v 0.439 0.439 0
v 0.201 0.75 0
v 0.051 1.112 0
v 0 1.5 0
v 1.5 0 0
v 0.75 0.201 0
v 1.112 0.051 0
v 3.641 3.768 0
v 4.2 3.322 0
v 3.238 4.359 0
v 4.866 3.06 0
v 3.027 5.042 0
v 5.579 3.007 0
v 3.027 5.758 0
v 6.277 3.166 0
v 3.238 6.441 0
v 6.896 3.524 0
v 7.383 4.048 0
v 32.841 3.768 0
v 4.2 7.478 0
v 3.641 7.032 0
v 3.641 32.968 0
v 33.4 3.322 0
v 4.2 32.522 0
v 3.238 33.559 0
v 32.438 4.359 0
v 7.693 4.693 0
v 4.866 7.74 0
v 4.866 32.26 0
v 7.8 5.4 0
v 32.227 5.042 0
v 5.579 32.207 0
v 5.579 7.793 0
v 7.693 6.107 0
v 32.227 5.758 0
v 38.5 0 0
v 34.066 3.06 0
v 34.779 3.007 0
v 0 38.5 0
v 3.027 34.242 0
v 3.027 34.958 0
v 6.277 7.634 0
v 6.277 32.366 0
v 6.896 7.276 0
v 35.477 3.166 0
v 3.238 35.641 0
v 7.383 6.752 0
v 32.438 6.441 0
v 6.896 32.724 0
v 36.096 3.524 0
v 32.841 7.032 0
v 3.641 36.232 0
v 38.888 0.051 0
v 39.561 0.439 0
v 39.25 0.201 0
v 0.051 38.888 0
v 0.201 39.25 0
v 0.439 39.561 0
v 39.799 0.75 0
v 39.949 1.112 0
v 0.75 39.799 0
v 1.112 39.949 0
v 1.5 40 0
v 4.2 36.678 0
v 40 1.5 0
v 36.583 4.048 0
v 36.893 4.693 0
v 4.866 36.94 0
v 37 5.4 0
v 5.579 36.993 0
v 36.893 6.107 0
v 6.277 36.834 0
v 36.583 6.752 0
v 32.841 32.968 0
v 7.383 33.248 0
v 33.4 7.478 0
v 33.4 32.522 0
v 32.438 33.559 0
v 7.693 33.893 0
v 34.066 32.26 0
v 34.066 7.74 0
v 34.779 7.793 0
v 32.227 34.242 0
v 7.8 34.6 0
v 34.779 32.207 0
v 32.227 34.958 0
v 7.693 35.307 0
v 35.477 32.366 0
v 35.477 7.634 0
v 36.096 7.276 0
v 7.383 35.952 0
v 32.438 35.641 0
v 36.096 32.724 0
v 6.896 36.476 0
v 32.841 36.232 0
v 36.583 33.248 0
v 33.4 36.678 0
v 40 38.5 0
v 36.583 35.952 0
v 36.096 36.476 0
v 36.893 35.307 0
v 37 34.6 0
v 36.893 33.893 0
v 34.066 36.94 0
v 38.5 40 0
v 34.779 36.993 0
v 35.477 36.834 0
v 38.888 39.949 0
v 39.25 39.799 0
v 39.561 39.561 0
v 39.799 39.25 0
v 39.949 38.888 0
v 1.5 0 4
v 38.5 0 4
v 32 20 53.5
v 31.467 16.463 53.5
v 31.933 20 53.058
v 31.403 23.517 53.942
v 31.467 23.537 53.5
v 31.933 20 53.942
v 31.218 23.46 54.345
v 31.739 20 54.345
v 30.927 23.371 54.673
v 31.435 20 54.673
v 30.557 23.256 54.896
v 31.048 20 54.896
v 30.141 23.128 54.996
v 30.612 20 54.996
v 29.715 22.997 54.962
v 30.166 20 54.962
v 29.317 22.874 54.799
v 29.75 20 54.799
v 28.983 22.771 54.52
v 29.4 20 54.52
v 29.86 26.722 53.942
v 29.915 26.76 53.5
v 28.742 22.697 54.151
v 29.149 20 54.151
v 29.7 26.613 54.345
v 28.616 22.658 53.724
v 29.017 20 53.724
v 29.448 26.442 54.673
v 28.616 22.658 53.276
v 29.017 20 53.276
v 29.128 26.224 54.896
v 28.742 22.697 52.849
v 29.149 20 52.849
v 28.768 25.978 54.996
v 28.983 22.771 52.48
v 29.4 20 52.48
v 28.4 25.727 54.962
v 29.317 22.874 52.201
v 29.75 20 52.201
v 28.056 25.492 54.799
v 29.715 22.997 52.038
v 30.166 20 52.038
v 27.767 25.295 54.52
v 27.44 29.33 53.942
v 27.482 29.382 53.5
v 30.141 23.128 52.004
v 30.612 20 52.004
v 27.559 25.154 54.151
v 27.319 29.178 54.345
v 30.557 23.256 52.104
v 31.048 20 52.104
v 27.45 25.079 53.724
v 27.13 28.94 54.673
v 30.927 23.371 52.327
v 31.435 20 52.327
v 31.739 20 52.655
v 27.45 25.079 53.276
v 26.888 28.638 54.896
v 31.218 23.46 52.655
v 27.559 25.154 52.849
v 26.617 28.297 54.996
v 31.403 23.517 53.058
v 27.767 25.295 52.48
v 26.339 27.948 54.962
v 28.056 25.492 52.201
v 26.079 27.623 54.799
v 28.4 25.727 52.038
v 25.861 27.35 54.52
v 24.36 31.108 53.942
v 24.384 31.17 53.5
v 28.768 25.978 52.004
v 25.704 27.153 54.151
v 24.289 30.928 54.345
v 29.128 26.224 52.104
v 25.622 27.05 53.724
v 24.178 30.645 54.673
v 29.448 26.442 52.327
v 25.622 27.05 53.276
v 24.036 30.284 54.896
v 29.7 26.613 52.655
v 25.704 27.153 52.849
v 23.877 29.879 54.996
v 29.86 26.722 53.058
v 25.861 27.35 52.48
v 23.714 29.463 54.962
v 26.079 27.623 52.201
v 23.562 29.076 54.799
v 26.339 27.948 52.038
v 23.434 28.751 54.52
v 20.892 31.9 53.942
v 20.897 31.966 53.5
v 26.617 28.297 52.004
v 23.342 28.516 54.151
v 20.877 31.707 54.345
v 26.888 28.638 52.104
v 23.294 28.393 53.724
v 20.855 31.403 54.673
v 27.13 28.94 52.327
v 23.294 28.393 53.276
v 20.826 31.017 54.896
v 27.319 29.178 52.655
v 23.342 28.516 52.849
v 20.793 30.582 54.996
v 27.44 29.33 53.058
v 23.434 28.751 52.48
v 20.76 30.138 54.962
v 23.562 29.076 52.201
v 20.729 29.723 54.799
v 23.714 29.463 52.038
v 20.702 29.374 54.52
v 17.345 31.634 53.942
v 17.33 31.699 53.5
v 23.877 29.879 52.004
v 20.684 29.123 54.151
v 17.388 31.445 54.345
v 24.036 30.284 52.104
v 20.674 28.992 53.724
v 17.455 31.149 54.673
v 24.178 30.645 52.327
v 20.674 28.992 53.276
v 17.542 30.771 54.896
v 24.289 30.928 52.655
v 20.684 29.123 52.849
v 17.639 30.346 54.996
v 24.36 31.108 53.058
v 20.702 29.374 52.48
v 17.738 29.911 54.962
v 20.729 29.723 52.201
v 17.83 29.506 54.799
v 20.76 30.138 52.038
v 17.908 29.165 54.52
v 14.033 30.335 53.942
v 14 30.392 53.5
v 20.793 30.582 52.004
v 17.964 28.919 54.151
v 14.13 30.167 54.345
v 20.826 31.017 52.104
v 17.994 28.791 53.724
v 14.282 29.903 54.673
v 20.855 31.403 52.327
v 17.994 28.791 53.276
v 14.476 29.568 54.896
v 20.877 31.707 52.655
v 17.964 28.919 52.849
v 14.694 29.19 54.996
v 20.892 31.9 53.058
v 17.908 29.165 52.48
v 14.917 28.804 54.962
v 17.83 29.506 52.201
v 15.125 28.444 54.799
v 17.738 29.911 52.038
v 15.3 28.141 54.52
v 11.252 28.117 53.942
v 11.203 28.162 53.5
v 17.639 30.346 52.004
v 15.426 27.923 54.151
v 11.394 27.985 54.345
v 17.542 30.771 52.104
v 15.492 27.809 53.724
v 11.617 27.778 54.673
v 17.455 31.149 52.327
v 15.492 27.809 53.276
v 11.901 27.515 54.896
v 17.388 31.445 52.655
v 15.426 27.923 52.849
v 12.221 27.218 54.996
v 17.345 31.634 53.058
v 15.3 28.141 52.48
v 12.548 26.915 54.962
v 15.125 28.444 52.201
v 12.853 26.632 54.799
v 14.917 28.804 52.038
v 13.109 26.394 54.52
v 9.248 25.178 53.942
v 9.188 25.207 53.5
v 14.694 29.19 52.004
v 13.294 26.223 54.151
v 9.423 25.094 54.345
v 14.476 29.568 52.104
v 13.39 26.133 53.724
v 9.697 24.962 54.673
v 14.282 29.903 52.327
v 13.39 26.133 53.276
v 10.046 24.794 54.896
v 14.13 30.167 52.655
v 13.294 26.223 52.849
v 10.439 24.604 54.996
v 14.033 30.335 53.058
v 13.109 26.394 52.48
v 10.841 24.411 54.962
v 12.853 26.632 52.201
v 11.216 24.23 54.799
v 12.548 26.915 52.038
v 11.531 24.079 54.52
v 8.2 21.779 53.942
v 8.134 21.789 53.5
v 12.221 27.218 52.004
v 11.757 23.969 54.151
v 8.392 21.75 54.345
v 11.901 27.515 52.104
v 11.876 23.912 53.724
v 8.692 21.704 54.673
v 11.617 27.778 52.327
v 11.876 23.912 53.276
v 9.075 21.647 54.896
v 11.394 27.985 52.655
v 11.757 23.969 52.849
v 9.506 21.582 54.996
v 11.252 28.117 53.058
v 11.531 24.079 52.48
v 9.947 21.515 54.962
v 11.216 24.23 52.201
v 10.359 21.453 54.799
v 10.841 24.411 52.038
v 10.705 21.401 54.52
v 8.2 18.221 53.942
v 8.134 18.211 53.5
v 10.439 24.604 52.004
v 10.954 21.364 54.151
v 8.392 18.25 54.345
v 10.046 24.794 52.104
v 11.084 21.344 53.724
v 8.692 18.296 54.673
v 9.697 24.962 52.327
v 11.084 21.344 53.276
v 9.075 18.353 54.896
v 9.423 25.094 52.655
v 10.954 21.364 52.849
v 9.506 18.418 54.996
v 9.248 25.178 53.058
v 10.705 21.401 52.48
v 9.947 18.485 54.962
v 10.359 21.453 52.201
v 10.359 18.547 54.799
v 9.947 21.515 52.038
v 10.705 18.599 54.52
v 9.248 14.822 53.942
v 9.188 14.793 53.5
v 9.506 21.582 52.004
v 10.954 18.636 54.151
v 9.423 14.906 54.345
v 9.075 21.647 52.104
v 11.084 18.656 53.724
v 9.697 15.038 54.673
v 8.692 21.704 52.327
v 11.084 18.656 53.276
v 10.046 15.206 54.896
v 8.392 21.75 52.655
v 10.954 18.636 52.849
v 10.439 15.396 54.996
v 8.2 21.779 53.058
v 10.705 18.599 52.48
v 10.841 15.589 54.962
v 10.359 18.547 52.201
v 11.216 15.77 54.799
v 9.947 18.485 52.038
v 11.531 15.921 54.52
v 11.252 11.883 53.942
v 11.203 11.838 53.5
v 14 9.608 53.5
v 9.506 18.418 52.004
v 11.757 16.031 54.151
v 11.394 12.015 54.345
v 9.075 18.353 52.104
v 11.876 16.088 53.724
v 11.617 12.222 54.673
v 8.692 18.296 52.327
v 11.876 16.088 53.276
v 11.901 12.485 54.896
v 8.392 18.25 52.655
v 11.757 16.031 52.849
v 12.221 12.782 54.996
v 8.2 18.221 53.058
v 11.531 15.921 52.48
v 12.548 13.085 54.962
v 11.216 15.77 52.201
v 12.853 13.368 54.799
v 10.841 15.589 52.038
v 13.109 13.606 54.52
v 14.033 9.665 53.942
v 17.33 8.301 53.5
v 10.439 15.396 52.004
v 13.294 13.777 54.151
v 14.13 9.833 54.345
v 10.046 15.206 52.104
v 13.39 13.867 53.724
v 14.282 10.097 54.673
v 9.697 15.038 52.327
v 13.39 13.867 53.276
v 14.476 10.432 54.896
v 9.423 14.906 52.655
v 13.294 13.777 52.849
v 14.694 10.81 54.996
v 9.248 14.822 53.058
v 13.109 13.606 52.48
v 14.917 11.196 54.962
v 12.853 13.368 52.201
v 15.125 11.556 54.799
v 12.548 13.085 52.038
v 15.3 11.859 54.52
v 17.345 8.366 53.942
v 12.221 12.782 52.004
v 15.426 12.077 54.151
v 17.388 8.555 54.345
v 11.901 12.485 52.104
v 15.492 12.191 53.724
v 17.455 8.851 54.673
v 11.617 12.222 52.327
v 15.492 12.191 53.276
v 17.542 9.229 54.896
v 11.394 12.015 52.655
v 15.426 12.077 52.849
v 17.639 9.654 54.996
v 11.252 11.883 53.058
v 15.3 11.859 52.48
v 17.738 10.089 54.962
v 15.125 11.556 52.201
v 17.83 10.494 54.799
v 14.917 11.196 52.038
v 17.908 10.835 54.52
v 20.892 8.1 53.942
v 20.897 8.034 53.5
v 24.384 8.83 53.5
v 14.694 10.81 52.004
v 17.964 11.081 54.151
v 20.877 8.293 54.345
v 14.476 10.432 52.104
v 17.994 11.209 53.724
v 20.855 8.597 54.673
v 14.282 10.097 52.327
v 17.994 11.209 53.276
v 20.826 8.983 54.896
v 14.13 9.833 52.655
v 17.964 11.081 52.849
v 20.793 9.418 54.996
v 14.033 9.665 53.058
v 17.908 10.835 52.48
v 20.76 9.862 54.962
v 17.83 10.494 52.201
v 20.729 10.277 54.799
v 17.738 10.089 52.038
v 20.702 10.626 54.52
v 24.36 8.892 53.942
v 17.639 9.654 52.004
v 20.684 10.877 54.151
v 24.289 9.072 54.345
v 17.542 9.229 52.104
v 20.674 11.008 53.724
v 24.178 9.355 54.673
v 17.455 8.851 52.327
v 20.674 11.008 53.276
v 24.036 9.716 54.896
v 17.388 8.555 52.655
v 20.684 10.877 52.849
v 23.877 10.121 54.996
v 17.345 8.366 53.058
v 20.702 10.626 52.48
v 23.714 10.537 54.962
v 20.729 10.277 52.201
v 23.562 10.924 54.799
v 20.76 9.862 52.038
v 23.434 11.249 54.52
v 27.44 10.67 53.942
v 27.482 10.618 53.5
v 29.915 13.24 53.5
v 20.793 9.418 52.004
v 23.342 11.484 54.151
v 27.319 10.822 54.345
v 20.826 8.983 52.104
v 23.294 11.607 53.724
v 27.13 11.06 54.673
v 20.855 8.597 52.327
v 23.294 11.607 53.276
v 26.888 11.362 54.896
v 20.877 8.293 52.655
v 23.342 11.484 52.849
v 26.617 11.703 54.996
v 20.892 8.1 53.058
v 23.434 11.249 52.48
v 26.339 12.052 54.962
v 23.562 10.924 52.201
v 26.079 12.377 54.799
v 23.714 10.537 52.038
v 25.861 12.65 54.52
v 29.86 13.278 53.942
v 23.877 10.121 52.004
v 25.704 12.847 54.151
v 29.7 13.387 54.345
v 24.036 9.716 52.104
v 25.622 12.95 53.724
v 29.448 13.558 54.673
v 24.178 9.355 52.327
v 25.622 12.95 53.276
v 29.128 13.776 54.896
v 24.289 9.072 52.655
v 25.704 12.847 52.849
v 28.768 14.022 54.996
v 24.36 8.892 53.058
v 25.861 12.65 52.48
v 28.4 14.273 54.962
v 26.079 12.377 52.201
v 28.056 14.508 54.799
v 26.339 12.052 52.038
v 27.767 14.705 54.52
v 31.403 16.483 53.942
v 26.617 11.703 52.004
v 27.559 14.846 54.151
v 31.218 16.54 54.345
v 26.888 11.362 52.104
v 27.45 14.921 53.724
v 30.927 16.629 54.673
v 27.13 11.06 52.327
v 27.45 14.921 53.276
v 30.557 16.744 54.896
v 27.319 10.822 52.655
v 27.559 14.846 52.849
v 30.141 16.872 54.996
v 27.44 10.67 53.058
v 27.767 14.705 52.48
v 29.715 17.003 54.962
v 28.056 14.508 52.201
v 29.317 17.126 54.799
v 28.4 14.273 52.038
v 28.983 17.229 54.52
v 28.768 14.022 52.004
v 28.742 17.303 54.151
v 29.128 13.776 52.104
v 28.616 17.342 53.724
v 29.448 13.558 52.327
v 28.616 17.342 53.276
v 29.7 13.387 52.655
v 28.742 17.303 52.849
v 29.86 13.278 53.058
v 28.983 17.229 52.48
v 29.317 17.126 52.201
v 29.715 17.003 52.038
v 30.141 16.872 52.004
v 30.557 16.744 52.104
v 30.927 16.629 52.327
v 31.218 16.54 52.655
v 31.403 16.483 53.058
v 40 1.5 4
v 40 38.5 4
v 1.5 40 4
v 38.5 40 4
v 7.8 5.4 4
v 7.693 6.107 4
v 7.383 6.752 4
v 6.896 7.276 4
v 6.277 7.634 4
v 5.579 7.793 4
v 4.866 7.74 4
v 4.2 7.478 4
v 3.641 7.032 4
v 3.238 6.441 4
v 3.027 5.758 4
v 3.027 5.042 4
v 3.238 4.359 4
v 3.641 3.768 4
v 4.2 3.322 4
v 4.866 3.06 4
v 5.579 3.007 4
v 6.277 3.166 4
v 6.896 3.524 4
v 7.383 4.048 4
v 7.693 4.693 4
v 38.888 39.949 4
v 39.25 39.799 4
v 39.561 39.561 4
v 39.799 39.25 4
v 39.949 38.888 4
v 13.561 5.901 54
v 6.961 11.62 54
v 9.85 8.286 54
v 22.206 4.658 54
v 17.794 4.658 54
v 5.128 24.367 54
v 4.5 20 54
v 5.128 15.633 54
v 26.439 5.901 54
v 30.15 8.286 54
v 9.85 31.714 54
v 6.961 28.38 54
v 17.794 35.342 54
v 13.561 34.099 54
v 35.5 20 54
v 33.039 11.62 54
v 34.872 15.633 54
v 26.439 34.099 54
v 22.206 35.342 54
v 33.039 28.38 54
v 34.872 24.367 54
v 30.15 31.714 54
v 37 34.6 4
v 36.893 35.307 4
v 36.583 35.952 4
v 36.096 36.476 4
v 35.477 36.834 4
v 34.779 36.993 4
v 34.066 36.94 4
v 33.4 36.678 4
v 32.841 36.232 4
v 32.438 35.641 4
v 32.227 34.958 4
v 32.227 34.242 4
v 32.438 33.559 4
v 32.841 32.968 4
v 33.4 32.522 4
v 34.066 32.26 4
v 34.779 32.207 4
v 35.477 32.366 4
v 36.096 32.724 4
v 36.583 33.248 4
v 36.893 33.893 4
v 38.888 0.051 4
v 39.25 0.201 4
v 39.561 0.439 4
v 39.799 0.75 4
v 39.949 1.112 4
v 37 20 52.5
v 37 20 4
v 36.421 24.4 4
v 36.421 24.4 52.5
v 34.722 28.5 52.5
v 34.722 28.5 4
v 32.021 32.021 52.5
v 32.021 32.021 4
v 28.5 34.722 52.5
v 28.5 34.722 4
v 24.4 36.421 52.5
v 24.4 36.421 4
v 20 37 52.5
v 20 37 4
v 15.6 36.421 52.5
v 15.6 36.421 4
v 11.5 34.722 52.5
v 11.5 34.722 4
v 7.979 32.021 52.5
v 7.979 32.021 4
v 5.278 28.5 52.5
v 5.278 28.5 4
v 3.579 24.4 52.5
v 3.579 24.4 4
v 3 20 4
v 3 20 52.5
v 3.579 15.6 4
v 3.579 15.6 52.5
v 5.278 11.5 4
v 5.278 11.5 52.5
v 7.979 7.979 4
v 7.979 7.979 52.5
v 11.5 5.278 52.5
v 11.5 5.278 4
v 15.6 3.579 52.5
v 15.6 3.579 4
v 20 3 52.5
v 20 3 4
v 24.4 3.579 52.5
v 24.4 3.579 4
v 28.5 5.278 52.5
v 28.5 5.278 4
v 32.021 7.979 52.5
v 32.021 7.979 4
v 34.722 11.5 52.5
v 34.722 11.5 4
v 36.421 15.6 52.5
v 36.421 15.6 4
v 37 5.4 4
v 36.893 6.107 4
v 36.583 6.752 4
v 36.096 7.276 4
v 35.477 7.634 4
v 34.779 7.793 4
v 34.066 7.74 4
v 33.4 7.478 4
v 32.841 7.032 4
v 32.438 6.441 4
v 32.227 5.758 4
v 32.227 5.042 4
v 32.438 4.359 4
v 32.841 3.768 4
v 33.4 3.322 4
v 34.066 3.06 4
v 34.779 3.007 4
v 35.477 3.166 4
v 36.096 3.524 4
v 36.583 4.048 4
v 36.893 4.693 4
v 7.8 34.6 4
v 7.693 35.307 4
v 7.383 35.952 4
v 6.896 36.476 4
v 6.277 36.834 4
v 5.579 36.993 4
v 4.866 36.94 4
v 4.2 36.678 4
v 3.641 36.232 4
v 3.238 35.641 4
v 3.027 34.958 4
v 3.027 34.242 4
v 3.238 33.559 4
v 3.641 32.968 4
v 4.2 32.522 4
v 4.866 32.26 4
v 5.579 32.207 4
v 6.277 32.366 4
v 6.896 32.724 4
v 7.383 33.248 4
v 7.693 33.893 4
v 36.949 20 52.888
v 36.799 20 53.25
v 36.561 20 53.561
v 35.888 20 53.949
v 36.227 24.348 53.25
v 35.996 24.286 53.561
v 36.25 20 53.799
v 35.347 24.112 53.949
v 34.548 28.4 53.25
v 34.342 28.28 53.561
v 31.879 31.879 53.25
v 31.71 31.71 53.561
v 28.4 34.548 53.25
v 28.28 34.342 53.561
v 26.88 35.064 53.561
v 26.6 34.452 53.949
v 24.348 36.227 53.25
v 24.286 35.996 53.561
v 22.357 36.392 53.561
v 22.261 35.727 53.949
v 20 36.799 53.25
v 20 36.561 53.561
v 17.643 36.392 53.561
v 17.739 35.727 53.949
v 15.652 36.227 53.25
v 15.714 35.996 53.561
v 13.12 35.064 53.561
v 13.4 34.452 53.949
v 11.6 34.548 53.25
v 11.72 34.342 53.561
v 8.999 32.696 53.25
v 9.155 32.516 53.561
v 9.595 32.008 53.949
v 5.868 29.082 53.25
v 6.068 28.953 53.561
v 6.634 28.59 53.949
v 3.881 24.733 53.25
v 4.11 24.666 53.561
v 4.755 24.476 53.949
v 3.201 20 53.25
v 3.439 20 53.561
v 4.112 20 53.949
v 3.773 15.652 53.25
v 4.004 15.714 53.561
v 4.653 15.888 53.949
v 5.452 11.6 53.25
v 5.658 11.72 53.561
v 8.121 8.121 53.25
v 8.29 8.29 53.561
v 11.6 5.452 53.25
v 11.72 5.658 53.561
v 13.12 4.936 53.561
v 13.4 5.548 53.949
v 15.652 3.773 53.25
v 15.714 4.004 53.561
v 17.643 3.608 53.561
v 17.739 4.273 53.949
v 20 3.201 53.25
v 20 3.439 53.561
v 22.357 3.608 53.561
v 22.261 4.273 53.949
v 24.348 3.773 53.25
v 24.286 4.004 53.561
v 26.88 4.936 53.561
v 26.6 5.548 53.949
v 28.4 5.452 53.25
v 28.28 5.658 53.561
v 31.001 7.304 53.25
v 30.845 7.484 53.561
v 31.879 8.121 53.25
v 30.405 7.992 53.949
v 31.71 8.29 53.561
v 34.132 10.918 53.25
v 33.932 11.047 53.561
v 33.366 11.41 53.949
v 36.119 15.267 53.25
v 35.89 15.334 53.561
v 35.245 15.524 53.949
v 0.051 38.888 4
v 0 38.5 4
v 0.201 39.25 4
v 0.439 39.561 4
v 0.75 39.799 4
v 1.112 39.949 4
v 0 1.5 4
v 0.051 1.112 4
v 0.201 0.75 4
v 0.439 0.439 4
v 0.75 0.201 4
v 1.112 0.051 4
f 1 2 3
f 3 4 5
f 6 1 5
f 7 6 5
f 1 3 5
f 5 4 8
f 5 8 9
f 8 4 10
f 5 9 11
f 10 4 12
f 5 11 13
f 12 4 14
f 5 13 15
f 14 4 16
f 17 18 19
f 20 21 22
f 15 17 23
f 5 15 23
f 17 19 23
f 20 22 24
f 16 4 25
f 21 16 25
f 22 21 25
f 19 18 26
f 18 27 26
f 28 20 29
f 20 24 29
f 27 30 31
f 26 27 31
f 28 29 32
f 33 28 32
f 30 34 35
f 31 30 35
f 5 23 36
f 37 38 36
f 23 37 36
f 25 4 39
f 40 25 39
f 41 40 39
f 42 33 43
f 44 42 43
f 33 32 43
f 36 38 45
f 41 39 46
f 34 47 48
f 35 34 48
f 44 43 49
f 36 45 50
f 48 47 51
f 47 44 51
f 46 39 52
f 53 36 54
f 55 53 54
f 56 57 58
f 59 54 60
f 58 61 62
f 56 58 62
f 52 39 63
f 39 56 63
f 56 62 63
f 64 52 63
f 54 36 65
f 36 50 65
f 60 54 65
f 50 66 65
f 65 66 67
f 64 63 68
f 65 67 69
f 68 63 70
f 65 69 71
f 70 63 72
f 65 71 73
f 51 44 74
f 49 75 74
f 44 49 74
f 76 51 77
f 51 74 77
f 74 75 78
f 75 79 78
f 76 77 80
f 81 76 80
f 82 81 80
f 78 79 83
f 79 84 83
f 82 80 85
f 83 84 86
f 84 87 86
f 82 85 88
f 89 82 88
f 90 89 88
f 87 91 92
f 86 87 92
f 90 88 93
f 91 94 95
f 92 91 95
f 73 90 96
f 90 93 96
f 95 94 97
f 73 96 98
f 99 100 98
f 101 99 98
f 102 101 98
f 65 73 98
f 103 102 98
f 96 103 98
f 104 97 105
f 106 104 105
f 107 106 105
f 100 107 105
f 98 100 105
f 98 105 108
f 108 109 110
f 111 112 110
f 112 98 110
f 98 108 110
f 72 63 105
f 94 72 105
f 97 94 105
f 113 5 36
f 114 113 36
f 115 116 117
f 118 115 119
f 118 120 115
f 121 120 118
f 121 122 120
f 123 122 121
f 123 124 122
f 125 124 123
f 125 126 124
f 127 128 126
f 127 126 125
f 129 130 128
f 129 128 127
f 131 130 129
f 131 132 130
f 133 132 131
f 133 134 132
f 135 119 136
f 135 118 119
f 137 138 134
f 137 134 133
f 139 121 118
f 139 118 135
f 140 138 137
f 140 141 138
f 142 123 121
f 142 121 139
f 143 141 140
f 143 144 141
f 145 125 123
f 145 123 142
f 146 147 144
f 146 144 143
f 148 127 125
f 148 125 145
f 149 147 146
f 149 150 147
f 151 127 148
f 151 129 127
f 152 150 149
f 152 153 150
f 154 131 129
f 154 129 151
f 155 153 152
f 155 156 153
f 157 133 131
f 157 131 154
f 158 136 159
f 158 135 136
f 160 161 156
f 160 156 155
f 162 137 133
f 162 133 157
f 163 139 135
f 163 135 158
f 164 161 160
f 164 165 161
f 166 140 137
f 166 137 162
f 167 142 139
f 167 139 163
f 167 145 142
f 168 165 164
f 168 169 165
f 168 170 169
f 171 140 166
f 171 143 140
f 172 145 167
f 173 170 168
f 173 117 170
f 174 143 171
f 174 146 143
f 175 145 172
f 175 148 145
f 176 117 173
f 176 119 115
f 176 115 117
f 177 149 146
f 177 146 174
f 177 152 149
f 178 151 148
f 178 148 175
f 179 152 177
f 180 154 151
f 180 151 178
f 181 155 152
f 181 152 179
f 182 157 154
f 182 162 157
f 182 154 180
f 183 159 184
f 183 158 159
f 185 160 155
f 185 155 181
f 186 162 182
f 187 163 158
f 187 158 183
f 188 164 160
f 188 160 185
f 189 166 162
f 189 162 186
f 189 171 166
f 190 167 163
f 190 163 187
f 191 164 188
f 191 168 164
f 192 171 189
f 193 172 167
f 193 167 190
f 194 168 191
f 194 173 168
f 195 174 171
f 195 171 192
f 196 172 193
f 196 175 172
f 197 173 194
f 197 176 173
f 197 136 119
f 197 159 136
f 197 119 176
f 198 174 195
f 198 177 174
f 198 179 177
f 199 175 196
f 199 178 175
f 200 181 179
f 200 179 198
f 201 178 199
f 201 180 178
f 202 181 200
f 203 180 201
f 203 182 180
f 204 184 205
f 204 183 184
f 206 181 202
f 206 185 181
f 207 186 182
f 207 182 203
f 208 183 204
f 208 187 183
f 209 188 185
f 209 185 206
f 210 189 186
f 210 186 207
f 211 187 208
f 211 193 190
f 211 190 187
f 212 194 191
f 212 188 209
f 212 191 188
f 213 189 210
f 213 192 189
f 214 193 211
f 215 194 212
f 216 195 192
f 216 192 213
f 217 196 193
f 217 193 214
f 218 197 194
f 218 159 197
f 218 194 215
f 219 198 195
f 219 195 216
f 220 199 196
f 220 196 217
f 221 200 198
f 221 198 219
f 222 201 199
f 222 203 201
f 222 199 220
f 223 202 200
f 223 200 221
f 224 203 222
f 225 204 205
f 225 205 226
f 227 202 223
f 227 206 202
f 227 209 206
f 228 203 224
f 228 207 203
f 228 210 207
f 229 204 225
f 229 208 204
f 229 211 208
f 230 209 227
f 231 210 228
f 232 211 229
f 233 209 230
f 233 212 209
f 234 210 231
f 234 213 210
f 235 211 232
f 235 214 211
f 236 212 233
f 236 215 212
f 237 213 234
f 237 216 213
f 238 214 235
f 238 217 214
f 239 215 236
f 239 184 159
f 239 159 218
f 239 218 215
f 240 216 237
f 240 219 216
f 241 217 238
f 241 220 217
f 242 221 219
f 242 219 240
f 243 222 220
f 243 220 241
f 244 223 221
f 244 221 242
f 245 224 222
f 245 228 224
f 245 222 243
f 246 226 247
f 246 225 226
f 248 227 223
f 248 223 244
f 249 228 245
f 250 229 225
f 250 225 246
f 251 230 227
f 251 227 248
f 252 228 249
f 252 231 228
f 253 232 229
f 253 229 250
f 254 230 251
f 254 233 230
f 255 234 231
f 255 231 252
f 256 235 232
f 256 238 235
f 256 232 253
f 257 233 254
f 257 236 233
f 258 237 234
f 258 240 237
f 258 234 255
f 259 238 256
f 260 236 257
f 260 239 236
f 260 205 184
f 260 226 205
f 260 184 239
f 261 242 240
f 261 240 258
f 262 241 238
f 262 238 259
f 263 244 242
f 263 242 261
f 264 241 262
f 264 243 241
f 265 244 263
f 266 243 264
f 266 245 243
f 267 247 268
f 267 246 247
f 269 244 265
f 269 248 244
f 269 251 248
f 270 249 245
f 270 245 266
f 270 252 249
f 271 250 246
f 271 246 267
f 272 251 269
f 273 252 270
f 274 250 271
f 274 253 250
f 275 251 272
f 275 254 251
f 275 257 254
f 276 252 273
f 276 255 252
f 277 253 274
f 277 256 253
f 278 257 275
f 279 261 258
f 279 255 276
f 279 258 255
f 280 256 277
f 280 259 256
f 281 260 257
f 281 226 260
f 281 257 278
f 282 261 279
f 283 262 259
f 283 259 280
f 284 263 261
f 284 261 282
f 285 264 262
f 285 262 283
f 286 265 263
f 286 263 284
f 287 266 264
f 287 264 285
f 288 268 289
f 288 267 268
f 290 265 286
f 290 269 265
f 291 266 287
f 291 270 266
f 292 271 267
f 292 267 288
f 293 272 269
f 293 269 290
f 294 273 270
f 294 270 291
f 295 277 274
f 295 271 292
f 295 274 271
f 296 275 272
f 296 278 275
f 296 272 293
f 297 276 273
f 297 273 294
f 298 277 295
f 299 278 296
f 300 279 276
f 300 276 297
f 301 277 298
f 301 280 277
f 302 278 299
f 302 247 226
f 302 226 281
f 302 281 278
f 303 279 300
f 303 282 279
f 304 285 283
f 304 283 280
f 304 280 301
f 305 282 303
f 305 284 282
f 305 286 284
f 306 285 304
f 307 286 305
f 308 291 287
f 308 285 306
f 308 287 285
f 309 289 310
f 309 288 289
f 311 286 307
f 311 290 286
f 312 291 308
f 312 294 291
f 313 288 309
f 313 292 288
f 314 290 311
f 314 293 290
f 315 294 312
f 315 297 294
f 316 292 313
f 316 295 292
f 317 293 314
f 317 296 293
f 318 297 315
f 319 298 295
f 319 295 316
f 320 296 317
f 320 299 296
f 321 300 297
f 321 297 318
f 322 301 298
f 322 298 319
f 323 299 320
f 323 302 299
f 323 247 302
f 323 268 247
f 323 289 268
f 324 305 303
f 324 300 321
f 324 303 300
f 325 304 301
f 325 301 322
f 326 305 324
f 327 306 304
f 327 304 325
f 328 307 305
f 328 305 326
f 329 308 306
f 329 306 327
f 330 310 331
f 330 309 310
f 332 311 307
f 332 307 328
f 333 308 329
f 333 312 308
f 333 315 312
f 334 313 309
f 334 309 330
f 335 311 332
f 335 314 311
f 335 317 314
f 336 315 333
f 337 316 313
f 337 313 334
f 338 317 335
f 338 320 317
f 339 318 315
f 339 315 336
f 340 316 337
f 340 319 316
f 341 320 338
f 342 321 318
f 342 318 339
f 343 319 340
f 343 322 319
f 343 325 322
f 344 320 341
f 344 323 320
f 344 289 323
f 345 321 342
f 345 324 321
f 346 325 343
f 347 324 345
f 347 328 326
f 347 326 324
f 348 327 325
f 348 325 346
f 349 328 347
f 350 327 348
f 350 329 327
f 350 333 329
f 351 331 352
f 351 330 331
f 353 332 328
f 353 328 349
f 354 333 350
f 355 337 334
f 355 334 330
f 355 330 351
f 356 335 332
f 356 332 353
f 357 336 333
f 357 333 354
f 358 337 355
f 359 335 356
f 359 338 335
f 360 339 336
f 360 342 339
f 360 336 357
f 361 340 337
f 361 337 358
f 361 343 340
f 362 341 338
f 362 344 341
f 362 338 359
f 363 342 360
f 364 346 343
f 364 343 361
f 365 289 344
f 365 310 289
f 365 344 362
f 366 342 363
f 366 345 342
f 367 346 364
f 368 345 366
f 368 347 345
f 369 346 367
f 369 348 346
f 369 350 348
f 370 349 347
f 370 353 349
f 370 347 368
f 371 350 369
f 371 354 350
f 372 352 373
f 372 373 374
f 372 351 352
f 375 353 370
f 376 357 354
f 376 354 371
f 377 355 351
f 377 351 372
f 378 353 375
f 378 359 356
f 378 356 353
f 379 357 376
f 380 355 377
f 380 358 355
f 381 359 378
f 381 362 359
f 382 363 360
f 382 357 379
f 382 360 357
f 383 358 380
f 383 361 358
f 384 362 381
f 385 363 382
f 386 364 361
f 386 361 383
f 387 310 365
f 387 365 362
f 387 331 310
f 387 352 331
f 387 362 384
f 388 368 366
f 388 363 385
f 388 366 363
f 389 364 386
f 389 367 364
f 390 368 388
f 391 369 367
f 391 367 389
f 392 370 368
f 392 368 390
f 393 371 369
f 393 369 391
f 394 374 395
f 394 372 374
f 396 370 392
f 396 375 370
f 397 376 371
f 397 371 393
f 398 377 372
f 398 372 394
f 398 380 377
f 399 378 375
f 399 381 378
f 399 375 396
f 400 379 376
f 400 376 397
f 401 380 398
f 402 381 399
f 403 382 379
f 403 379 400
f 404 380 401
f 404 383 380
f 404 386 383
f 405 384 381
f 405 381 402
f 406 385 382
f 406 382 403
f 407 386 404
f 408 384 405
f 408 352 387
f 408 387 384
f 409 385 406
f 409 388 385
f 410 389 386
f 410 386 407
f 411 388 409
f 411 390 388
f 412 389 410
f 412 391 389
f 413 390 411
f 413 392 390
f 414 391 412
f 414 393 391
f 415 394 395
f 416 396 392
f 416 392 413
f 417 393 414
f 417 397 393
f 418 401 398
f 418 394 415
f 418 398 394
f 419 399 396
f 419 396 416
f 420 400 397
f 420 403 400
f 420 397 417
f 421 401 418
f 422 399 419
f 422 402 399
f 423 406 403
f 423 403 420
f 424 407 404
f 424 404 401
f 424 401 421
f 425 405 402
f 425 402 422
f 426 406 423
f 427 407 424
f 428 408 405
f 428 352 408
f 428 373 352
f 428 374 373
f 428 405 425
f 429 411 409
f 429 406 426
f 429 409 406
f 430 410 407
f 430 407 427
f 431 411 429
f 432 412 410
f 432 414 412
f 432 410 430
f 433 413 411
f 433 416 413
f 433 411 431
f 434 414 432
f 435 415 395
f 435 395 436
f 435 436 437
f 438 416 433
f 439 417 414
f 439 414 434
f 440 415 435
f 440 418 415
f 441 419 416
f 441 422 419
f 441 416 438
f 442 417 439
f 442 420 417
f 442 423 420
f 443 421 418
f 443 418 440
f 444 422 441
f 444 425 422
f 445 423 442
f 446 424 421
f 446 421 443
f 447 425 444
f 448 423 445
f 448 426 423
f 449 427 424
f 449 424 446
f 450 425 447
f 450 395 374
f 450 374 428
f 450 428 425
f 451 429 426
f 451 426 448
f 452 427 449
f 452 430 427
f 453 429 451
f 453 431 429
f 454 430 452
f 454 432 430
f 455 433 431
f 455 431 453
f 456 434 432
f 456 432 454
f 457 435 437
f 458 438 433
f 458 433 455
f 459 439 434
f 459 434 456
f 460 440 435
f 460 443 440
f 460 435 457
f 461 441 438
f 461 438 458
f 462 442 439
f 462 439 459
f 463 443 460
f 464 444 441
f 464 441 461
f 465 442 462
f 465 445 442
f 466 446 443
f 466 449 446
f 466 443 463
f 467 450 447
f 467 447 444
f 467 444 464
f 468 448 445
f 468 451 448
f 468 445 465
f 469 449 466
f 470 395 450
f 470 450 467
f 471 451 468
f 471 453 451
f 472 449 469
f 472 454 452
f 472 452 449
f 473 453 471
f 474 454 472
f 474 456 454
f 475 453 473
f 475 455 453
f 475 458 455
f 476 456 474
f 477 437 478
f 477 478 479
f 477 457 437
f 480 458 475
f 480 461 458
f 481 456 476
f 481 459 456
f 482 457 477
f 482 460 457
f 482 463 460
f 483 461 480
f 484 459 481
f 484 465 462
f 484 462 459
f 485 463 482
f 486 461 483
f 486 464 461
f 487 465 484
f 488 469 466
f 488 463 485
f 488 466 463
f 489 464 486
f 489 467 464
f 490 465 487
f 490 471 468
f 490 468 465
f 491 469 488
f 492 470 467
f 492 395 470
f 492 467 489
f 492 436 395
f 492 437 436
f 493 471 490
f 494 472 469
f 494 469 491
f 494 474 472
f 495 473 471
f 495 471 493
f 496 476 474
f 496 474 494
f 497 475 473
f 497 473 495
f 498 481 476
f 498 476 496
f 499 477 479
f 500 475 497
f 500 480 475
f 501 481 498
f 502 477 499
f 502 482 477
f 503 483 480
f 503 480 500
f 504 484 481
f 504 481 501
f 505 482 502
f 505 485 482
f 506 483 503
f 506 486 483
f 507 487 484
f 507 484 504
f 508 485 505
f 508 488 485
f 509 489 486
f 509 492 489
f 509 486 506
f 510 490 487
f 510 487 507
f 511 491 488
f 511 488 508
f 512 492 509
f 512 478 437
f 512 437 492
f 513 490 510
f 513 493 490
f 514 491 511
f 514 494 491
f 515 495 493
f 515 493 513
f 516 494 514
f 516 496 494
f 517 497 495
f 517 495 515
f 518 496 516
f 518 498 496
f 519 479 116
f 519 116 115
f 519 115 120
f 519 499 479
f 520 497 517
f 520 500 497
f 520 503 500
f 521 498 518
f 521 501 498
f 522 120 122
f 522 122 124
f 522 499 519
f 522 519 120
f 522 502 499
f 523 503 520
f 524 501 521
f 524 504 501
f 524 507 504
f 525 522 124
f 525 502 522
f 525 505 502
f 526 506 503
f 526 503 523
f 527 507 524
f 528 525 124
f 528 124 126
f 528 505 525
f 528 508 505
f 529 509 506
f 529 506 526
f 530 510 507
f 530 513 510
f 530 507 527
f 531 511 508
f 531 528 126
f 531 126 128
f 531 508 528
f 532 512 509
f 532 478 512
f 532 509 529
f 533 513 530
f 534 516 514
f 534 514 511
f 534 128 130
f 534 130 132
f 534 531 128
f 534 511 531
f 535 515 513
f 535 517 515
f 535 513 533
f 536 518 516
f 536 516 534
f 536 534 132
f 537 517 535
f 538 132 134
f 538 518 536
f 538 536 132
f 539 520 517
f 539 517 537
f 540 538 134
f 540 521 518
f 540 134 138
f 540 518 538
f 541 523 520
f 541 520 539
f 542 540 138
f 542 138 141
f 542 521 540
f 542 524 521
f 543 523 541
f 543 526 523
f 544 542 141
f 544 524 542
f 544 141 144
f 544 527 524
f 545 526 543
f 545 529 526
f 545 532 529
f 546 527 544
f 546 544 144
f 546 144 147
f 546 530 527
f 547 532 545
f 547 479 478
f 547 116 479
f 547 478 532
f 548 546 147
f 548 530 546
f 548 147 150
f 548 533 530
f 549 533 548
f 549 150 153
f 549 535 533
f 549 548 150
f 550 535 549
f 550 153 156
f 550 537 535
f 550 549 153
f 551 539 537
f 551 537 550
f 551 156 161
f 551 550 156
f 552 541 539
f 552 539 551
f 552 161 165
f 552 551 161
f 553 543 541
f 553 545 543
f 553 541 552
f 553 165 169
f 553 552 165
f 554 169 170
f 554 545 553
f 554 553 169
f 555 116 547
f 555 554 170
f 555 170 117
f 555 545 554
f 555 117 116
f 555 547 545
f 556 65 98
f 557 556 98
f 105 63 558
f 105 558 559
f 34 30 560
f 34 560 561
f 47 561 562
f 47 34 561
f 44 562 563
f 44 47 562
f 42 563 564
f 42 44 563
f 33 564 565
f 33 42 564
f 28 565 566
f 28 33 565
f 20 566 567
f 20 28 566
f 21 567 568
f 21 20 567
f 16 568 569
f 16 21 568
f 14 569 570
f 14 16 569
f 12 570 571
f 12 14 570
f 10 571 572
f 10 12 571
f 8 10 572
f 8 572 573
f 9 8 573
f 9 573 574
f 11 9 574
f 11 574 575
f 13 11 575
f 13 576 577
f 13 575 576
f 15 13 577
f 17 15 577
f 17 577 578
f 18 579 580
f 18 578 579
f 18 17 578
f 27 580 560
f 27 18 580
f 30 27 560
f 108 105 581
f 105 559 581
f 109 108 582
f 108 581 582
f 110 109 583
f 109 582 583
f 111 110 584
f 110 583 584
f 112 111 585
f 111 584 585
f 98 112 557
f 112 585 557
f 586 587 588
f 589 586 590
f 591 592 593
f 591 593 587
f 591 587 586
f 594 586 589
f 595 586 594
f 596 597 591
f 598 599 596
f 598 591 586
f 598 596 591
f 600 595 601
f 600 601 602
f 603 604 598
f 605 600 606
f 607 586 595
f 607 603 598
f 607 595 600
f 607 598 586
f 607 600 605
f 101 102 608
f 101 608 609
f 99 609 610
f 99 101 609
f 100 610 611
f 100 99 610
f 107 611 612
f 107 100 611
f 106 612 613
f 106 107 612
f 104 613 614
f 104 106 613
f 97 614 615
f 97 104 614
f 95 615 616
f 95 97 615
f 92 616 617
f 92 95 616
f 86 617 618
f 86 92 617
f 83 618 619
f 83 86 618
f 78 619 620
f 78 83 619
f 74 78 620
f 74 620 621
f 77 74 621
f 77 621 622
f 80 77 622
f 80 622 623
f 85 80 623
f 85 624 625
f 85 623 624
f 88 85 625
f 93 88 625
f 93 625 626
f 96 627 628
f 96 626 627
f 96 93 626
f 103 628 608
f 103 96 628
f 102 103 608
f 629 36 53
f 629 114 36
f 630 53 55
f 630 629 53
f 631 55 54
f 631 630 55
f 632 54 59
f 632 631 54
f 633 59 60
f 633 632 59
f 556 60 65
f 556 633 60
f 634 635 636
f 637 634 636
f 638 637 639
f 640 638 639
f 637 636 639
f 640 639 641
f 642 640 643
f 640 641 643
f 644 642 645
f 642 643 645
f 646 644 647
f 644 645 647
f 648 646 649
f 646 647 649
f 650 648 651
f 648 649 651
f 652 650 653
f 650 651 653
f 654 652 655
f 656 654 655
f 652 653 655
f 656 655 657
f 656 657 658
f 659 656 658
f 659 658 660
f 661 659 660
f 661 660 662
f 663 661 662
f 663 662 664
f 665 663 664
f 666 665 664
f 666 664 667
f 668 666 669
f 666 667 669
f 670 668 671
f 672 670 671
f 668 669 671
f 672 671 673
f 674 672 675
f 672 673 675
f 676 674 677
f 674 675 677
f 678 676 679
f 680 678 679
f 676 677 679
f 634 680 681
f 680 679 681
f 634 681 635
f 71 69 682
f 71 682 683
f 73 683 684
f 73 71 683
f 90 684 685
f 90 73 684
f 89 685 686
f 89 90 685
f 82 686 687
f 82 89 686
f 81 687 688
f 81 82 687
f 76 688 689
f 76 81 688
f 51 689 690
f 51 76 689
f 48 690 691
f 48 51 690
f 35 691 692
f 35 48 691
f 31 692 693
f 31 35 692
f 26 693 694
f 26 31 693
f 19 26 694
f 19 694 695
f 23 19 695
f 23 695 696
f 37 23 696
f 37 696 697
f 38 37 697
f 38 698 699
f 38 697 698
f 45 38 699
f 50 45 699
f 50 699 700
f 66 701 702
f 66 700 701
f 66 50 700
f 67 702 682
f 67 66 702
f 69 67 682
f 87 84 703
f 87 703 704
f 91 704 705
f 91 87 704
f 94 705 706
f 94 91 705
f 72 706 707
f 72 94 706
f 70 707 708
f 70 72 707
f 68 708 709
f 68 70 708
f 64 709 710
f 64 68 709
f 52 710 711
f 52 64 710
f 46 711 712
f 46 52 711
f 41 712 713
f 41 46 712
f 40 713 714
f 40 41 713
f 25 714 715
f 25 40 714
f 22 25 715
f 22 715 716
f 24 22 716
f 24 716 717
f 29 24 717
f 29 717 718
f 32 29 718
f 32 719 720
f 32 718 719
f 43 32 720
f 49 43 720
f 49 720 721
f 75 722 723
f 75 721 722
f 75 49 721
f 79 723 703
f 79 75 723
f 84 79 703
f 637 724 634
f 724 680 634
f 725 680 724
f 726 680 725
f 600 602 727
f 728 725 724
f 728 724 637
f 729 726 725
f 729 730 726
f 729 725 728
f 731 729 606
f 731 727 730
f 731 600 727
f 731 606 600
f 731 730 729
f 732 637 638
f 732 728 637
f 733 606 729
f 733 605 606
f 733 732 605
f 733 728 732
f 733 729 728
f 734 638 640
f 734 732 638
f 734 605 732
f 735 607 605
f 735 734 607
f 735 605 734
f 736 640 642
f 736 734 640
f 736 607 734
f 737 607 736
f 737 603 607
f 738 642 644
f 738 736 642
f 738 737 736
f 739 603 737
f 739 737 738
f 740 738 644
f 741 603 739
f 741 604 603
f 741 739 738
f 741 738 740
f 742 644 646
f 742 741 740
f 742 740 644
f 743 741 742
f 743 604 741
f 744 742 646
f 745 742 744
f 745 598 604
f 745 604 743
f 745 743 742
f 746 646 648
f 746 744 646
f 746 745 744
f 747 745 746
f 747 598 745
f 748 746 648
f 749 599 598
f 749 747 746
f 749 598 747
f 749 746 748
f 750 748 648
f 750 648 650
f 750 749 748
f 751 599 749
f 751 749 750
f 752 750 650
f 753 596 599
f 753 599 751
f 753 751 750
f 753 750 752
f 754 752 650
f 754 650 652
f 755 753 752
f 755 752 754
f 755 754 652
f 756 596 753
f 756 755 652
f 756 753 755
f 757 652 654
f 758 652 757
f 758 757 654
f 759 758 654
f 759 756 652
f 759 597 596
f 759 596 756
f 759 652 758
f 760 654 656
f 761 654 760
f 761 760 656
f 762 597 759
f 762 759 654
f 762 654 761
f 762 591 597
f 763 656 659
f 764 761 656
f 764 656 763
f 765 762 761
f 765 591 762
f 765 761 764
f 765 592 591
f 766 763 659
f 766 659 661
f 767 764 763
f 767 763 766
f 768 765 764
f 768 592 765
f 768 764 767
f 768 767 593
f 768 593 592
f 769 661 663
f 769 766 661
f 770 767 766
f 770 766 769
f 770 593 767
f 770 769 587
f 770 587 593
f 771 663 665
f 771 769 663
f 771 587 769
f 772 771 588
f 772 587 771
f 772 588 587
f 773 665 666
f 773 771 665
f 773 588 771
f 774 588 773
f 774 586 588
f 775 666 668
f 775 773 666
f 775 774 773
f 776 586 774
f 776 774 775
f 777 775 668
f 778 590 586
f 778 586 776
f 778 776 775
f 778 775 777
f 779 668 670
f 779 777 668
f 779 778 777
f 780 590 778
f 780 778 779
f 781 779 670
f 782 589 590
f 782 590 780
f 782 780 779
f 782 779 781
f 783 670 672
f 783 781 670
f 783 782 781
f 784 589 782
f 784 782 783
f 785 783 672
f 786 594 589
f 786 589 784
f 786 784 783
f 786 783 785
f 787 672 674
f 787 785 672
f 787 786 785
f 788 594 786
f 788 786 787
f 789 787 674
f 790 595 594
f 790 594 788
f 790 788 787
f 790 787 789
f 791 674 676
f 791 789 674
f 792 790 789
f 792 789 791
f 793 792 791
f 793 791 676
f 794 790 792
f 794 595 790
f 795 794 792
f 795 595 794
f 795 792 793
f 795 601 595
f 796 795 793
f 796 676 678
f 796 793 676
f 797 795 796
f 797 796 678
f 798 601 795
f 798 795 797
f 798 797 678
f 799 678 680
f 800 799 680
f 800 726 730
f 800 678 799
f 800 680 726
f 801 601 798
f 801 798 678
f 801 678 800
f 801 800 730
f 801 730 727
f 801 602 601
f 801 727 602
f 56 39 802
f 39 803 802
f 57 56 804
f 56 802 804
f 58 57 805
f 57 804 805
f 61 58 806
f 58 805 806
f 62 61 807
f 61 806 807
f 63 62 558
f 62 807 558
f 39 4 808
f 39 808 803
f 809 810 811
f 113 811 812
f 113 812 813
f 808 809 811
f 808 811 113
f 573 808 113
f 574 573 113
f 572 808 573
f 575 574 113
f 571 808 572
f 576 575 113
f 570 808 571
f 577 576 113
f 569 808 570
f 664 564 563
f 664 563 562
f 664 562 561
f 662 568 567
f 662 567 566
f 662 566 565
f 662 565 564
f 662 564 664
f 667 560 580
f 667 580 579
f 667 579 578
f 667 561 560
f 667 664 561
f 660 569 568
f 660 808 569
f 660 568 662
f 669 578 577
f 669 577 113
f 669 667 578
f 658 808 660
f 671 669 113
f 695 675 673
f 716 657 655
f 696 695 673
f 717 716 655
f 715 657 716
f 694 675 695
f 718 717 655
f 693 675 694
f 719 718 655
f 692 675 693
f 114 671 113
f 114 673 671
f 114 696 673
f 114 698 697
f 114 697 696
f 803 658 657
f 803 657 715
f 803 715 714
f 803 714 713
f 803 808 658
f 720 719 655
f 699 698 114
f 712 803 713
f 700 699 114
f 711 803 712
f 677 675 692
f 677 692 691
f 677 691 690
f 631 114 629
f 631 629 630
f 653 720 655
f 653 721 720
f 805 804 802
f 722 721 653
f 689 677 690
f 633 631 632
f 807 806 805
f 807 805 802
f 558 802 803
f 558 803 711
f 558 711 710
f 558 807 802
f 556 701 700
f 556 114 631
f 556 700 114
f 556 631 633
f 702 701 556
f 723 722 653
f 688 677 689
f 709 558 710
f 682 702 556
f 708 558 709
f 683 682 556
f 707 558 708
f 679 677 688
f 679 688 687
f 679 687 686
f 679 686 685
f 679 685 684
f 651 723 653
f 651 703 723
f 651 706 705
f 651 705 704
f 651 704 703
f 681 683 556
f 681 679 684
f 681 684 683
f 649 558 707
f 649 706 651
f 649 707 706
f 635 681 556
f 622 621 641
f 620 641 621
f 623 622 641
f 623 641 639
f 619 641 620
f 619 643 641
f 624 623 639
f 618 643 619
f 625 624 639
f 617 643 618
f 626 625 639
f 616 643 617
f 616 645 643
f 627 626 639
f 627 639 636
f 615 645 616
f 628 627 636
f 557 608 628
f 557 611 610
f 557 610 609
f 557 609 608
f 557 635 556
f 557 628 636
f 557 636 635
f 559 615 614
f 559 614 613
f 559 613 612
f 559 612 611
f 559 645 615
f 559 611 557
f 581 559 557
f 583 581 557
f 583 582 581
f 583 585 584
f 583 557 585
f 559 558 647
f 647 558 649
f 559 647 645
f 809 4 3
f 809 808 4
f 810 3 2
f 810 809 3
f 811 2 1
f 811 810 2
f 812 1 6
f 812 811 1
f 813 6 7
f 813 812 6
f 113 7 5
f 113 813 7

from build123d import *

# Parameters (mm, degrees)
TORUS_R           = 1.5
CYLINDER001_R     = 17
CYLINDER001_DEPTH = 50
FILLET001_R       = 1.5
CYLINDER_R        = 2.4
CYLINDER_DEPTH    = 10
ARRAY_X_COUNT     = 2
ARRAY_X_PITCH     = 29.2
ARRAY_Y_COUNT     = 2
ARRAY_Y_PITCH     = 29.2
BOX_W             = 40
BOX_H             = 40
BOX_DEPTH         = 4
FILLET_R          = 1.5


with BuildPart() as torus:
    # Torus → Torus (revolve)
    with BuildSketch(Plane(origin=(20, 20, 53.5), x_dir=(1, 0, 0), z_dir=(0, -1, 0))):
        with Locations((10.5, 0)):
            Circle(TORUS_R)
    revolve(axis=Axis((20, 20, 53.5), (0, 0, 1)))


with BuildPart() as pota001:
    # Cylinder001 → Cylinder001 (new body)
    with BuildSketch(Plane(origin=(20, 20, 4), x_dir=(1, 0, 0), z_dir=(0, 0, 1))):
        Circle(CYLINDER001_R)
    extrude(amount=CYLINDER001_DEPTH)

    # Fillet001
    fillet001_edges = [pota001.edges().sort_by_distance(p)[0] for p in [
        (3, 20, 54),
    ]]
    fillet(fillet001_edges, radius=FILLET001_R)


with BuildPart() as array:
    # Cylinder → Cylinder (new body)
    with BuildSketch(Plane(origin=(5.4, 5.4, -2), x_dir=(1, 0, 0), z_dir=(0, 0, 1))):
        Circle(CYLINDER_R)
    extrude(amount=CYLINDER_DEPTH)

    # Array X: Array ×2


with BuildPart() as array_1:
    add(array.part)
    with Locations(*[(i * ARRAY_X_PITCH, 0, 0) for i in range(1, ARRAY_X_COUNT)]):
        add(array.part)

    # Array Y: Array ×2


with BuildPart() as array_2:
    add(array_1.part)
    with Locations(*[(0, i * ARRAY_Y_PITCH, 0) for i in range(1, ARRAY_Y_COUNT)]):
        add(array_1.part)


with BuildPart() as fusion:
    # Box → Box (new body)
    with BuildSketch(Plane.XY):
        with Locations((20, 20)):
            Rectangle(BOX_W, BOX_H)
    extrude(amount=BOX_DEPTH)

    # Cut: cut Array
    add(array_2.part, mode=Mode.SUBTRACT)

    # Fillet
    fillet_edges = [fusion.edges().sort_by_distance(p)[0] for p in [
        (0, 0, 2),
        (0, 40, 2),
        (40, 0, 2),
        (40, 40, 2),
    ]]
    fillet(fillet_edges, radius=FILLET_R)

    # Fusion: union pota001
    add(pota001.part)


solid = Compound([torus.part, fusion.part])
